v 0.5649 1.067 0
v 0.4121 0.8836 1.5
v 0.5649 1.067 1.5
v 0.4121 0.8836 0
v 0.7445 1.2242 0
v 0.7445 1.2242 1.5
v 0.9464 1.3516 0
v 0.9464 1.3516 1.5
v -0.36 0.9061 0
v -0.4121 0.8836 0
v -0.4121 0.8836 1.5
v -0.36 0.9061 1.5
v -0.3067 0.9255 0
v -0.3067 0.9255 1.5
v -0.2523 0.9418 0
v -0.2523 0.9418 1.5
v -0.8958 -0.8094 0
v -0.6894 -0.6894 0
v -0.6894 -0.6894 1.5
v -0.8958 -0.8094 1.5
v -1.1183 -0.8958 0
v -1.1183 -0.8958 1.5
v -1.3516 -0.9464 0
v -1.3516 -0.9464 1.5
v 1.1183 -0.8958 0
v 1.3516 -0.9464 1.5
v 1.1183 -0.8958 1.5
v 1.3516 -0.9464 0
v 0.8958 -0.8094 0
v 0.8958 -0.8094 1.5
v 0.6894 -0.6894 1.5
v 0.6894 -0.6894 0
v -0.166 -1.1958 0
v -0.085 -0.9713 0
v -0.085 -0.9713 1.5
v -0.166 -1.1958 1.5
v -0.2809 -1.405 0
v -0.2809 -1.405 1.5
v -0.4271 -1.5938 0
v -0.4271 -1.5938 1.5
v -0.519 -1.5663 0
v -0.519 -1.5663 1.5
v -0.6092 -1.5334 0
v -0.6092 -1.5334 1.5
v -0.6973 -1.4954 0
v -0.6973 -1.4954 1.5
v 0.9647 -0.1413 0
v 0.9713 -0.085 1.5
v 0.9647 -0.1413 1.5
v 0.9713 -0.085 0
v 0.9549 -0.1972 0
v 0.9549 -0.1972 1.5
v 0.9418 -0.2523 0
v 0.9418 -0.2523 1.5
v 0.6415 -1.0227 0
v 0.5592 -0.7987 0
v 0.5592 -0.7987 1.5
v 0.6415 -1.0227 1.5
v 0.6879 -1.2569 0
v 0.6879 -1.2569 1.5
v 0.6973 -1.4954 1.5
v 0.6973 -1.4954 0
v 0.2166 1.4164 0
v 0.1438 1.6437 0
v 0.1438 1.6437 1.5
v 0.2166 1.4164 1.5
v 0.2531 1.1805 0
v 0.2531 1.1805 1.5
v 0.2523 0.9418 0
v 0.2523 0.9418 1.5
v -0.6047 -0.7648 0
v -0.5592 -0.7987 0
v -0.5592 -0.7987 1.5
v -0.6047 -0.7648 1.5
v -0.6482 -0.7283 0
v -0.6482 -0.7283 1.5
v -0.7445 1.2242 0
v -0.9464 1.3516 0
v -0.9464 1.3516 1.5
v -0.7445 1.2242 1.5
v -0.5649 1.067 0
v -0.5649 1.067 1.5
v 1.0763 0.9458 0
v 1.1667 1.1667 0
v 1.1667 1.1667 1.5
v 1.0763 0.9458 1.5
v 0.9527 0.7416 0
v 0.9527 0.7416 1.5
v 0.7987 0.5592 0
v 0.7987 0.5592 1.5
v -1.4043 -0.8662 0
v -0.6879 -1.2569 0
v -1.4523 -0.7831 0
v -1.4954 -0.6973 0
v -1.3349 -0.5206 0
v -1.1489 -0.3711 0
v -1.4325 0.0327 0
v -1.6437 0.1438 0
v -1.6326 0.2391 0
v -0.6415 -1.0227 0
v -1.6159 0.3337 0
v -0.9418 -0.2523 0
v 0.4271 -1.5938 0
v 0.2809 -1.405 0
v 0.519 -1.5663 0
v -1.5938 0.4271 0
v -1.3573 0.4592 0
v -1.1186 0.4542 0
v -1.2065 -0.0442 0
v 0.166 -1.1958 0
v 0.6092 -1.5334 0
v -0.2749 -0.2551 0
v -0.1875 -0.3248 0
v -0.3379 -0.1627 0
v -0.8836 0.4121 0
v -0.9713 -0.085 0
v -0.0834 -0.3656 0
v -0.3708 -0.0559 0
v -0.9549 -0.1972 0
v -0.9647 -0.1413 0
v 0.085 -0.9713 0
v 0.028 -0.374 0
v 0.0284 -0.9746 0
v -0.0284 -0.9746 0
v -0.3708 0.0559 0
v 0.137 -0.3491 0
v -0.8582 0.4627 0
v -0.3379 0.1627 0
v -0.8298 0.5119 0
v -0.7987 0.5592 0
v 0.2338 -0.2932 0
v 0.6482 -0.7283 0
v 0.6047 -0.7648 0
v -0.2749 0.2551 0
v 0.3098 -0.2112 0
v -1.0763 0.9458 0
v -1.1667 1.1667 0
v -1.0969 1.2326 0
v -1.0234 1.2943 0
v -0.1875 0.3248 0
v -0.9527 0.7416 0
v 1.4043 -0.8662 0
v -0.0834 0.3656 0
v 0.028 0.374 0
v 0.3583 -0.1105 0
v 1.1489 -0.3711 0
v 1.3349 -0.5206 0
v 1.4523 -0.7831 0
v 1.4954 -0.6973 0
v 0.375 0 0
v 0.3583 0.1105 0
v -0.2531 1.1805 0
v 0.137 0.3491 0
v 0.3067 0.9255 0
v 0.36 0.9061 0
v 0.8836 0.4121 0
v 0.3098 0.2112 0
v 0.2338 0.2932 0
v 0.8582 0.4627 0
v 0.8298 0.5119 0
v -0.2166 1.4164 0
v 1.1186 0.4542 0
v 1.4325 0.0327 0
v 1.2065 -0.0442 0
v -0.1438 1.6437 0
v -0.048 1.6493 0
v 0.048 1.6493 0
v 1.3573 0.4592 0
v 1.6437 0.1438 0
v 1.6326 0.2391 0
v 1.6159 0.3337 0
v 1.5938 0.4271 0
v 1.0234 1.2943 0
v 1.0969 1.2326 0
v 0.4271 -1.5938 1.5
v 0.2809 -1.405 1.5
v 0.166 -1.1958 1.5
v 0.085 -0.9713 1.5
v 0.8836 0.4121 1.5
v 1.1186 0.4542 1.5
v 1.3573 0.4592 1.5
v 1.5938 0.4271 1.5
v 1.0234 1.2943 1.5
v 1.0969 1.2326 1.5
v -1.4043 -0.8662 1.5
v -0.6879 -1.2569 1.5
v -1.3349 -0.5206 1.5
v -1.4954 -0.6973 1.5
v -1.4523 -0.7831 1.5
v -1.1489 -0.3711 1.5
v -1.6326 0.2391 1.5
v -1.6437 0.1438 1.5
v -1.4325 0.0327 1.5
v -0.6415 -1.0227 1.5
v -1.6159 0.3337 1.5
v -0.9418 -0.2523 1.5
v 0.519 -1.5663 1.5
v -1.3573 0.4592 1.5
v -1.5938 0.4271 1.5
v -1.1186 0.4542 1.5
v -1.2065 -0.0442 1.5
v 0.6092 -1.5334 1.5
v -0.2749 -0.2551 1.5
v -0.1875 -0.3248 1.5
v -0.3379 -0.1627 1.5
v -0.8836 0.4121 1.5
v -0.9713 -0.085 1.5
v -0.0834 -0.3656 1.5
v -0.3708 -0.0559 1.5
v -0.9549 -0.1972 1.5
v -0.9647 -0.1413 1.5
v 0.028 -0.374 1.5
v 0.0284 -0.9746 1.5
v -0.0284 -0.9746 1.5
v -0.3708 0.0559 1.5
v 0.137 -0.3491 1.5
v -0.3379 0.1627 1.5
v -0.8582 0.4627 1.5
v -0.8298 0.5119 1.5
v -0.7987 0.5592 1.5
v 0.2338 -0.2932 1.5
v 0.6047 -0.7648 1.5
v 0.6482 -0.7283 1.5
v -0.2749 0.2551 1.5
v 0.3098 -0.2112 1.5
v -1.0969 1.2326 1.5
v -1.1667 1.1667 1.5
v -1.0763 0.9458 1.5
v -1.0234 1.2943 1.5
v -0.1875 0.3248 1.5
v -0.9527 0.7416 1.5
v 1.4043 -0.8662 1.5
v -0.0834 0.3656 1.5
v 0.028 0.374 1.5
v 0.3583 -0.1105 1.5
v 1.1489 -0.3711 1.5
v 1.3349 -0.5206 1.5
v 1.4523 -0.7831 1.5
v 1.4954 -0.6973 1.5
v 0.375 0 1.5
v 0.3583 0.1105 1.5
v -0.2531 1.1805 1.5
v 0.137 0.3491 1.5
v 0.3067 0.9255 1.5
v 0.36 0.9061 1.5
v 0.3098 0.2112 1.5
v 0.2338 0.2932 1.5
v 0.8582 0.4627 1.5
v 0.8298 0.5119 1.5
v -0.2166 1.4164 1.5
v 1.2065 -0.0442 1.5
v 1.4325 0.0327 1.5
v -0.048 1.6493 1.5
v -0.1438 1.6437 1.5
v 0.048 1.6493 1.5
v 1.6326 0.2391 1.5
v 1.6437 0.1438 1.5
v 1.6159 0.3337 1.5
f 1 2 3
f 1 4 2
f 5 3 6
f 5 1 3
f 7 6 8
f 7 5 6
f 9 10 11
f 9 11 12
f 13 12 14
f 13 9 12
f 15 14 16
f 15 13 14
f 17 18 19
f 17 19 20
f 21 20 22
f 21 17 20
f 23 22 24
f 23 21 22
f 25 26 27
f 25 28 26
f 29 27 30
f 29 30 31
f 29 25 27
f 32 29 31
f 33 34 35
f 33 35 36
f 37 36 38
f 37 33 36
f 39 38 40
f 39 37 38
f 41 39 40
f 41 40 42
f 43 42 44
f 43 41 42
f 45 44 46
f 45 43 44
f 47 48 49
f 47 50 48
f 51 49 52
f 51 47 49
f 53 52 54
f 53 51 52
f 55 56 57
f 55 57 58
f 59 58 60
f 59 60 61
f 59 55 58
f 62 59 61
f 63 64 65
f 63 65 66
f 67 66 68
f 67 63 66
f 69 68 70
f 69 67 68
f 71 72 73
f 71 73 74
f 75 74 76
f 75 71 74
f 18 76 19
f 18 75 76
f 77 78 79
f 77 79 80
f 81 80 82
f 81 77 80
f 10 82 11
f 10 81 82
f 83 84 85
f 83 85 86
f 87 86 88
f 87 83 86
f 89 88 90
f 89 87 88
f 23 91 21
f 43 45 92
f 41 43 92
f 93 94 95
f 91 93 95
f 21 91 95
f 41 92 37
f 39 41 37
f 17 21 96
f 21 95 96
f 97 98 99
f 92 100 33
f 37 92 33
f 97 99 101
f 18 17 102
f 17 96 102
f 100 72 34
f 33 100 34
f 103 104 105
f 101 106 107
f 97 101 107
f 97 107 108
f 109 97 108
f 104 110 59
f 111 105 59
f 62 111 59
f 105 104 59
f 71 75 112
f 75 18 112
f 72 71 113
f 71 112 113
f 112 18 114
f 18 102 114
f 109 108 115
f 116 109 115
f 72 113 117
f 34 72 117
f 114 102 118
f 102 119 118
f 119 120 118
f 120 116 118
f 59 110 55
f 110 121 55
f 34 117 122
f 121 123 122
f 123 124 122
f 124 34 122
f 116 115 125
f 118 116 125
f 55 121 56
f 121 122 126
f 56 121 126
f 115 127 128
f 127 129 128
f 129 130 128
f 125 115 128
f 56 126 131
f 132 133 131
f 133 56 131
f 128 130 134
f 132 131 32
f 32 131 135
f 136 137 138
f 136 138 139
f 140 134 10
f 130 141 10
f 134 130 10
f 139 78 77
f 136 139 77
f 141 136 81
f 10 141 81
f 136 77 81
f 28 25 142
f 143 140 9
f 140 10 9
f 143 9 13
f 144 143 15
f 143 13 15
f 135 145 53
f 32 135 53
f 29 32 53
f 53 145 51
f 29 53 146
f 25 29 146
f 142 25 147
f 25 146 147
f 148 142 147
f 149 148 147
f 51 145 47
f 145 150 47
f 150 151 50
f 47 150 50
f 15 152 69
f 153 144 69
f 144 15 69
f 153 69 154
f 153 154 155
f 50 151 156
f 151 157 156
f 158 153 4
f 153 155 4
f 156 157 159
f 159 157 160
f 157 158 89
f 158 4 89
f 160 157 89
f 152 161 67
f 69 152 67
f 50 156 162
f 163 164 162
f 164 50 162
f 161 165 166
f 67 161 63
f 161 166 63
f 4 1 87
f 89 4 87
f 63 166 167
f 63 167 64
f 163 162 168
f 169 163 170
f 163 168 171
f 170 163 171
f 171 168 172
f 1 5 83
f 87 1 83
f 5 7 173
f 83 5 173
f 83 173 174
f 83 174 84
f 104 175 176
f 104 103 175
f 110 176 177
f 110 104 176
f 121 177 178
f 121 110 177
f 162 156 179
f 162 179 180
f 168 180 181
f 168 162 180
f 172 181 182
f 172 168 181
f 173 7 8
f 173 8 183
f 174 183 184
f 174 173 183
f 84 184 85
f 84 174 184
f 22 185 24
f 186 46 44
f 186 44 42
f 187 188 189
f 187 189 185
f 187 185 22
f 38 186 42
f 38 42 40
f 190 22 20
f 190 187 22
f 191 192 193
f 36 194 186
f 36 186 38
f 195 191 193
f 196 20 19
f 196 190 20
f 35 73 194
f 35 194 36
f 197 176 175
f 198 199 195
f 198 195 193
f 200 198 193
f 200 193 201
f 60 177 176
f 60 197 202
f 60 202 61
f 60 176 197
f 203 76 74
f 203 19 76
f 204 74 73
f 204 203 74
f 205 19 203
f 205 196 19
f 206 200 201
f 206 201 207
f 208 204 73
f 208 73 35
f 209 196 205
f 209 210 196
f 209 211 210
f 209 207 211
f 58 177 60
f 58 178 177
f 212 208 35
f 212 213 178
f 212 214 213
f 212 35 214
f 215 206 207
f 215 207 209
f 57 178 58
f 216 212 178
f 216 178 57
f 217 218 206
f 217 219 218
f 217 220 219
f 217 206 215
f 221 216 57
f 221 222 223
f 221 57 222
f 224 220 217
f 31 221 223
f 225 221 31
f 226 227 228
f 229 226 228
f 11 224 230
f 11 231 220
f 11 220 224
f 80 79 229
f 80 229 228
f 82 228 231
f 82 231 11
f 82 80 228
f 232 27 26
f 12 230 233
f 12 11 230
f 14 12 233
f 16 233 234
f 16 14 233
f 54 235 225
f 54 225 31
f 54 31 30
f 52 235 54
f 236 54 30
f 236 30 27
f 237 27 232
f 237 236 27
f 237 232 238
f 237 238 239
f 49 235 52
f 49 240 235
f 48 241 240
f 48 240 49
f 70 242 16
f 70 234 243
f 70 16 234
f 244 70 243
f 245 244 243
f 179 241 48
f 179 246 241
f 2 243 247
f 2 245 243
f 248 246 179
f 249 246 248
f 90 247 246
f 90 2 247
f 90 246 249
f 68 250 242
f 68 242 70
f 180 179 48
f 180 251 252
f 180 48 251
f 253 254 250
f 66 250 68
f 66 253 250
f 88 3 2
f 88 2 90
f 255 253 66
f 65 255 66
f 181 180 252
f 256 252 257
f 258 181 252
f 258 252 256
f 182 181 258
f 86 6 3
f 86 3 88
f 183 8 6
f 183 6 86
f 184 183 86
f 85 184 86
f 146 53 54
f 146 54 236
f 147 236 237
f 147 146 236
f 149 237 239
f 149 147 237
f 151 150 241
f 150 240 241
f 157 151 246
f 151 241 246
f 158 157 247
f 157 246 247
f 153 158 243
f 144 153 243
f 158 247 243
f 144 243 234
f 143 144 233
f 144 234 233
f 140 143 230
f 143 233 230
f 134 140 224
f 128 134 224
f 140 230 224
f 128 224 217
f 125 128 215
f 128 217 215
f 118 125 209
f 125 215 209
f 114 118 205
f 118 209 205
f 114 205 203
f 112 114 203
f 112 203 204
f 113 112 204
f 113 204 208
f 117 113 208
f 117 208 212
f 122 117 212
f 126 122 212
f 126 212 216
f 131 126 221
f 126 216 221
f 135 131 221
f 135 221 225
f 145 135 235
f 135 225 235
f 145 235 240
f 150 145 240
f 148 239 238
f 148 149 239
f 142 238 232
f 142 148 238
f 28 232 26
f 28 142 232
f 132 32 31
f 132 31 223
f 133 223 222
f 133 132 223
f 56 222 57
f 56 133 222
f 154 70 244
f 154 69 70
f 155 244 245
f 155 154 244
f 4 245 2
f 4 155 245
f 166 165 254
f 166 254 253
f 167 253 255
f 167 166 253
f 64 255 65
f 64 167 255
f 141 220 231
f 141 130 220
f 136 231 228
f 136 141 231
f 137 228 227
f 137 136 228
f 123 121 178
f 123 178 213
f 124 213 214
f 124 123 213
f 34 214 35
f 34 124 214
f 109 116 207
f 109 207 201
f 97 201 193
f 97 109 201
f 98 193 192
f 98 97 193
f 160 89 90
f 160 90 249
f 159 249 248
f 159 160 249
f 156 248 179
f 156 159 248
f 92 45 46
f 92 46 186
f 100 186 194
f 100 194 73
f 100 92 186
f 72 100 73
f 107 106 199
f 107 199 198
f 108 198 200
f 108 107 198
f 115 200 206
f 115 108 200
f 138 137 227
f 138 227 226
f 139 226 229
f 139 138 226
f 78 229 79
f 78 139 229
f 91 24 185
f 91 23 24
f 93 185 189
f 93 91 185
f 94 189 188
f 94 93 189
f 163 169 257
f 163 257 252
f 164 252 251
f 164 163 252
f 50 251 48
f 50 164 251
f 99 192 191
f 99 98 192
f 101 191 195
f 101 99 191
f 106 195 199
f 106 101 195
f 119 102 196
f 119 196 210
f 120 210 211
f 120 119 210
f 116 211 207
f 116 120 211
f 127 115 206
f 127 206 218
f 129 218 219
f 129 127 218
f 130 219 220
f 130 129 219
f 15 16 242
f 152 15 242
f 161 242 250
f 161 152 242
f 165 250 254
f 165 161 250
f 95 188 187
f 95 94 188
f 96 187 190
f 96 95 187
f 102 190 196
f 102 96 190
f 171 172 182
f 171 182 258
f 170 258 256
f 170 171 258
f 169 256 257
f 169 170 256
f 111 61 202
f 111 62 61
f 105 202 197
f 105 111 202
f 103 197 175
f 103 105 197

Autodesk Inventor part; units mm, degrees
sketch "Sketch1" plane through (0, 0, 0) normal (0, 0, 1) x (1, 0, 0)
  circle A0 centre (0, 0) radius 1.65
  dimension "d0" = 3.3
extrude "Extrusion1" add sketch "Sketch1" along normal blind 1.5
ref_plane "Work Plane2" through (0, 0, 0.75) normal (0, 0, 1) x (1, 0, 0)
sketch "Sketch2" plane through (0, 0, 0) normal (0, 0, -1) x (-1, 0, 0)
  circle A0 centre (0, 0) radius 1.65 projected
  circle A1 centre (0, 0) radius 1.35
  dimension "d3" = 2.7
surface extrude "ピッチ円直径" sketch "Sketch2" against normal through all shown no curves A1
ref_plane "Work Plane8" through (0, 0, 0) normal (0.9396926, 0.3420201, 0) x (0, 0, 1)
ref_plane "Work Plane9" through (0, 0, 0) normal (1, 0, 0) x (0, 1, 0)
spur gear teeth "平歯車" teeth 9 pitch diameter 2.7 tip diameter 3.3 root diameter 1.95 face width 1.5 start plane through (0, 0, 0) normal (0, 0, -1) x (-1, 0, 0)
sketch "スケッチ3" plane through (0, 0, 1.5) normal (0, 0, 1) x (1, 0, 0)
  circle A0 centre (0, 0) radius 0.375
  dimension "d49" = 0.75
extrude "押し出し2" cut sketch "スケッチ3" against normal through all
equation "\"d0\" = da_da"
equation "\"d1\" = da_b"
equation "\"d3\" = da_d"
equation "\"d16\" = da_aw"
equation "\"d43\" = da_aw"
equation "\"d46\" = da_aw"
equation "\"da_da\" = 3.3"
equation "\"da_b\" = 1.5"
equation "\"da_d\" = 2.7"
equation "\"da_aw\" = 7.05"
properties part number "平歯車2" material "Steel"
